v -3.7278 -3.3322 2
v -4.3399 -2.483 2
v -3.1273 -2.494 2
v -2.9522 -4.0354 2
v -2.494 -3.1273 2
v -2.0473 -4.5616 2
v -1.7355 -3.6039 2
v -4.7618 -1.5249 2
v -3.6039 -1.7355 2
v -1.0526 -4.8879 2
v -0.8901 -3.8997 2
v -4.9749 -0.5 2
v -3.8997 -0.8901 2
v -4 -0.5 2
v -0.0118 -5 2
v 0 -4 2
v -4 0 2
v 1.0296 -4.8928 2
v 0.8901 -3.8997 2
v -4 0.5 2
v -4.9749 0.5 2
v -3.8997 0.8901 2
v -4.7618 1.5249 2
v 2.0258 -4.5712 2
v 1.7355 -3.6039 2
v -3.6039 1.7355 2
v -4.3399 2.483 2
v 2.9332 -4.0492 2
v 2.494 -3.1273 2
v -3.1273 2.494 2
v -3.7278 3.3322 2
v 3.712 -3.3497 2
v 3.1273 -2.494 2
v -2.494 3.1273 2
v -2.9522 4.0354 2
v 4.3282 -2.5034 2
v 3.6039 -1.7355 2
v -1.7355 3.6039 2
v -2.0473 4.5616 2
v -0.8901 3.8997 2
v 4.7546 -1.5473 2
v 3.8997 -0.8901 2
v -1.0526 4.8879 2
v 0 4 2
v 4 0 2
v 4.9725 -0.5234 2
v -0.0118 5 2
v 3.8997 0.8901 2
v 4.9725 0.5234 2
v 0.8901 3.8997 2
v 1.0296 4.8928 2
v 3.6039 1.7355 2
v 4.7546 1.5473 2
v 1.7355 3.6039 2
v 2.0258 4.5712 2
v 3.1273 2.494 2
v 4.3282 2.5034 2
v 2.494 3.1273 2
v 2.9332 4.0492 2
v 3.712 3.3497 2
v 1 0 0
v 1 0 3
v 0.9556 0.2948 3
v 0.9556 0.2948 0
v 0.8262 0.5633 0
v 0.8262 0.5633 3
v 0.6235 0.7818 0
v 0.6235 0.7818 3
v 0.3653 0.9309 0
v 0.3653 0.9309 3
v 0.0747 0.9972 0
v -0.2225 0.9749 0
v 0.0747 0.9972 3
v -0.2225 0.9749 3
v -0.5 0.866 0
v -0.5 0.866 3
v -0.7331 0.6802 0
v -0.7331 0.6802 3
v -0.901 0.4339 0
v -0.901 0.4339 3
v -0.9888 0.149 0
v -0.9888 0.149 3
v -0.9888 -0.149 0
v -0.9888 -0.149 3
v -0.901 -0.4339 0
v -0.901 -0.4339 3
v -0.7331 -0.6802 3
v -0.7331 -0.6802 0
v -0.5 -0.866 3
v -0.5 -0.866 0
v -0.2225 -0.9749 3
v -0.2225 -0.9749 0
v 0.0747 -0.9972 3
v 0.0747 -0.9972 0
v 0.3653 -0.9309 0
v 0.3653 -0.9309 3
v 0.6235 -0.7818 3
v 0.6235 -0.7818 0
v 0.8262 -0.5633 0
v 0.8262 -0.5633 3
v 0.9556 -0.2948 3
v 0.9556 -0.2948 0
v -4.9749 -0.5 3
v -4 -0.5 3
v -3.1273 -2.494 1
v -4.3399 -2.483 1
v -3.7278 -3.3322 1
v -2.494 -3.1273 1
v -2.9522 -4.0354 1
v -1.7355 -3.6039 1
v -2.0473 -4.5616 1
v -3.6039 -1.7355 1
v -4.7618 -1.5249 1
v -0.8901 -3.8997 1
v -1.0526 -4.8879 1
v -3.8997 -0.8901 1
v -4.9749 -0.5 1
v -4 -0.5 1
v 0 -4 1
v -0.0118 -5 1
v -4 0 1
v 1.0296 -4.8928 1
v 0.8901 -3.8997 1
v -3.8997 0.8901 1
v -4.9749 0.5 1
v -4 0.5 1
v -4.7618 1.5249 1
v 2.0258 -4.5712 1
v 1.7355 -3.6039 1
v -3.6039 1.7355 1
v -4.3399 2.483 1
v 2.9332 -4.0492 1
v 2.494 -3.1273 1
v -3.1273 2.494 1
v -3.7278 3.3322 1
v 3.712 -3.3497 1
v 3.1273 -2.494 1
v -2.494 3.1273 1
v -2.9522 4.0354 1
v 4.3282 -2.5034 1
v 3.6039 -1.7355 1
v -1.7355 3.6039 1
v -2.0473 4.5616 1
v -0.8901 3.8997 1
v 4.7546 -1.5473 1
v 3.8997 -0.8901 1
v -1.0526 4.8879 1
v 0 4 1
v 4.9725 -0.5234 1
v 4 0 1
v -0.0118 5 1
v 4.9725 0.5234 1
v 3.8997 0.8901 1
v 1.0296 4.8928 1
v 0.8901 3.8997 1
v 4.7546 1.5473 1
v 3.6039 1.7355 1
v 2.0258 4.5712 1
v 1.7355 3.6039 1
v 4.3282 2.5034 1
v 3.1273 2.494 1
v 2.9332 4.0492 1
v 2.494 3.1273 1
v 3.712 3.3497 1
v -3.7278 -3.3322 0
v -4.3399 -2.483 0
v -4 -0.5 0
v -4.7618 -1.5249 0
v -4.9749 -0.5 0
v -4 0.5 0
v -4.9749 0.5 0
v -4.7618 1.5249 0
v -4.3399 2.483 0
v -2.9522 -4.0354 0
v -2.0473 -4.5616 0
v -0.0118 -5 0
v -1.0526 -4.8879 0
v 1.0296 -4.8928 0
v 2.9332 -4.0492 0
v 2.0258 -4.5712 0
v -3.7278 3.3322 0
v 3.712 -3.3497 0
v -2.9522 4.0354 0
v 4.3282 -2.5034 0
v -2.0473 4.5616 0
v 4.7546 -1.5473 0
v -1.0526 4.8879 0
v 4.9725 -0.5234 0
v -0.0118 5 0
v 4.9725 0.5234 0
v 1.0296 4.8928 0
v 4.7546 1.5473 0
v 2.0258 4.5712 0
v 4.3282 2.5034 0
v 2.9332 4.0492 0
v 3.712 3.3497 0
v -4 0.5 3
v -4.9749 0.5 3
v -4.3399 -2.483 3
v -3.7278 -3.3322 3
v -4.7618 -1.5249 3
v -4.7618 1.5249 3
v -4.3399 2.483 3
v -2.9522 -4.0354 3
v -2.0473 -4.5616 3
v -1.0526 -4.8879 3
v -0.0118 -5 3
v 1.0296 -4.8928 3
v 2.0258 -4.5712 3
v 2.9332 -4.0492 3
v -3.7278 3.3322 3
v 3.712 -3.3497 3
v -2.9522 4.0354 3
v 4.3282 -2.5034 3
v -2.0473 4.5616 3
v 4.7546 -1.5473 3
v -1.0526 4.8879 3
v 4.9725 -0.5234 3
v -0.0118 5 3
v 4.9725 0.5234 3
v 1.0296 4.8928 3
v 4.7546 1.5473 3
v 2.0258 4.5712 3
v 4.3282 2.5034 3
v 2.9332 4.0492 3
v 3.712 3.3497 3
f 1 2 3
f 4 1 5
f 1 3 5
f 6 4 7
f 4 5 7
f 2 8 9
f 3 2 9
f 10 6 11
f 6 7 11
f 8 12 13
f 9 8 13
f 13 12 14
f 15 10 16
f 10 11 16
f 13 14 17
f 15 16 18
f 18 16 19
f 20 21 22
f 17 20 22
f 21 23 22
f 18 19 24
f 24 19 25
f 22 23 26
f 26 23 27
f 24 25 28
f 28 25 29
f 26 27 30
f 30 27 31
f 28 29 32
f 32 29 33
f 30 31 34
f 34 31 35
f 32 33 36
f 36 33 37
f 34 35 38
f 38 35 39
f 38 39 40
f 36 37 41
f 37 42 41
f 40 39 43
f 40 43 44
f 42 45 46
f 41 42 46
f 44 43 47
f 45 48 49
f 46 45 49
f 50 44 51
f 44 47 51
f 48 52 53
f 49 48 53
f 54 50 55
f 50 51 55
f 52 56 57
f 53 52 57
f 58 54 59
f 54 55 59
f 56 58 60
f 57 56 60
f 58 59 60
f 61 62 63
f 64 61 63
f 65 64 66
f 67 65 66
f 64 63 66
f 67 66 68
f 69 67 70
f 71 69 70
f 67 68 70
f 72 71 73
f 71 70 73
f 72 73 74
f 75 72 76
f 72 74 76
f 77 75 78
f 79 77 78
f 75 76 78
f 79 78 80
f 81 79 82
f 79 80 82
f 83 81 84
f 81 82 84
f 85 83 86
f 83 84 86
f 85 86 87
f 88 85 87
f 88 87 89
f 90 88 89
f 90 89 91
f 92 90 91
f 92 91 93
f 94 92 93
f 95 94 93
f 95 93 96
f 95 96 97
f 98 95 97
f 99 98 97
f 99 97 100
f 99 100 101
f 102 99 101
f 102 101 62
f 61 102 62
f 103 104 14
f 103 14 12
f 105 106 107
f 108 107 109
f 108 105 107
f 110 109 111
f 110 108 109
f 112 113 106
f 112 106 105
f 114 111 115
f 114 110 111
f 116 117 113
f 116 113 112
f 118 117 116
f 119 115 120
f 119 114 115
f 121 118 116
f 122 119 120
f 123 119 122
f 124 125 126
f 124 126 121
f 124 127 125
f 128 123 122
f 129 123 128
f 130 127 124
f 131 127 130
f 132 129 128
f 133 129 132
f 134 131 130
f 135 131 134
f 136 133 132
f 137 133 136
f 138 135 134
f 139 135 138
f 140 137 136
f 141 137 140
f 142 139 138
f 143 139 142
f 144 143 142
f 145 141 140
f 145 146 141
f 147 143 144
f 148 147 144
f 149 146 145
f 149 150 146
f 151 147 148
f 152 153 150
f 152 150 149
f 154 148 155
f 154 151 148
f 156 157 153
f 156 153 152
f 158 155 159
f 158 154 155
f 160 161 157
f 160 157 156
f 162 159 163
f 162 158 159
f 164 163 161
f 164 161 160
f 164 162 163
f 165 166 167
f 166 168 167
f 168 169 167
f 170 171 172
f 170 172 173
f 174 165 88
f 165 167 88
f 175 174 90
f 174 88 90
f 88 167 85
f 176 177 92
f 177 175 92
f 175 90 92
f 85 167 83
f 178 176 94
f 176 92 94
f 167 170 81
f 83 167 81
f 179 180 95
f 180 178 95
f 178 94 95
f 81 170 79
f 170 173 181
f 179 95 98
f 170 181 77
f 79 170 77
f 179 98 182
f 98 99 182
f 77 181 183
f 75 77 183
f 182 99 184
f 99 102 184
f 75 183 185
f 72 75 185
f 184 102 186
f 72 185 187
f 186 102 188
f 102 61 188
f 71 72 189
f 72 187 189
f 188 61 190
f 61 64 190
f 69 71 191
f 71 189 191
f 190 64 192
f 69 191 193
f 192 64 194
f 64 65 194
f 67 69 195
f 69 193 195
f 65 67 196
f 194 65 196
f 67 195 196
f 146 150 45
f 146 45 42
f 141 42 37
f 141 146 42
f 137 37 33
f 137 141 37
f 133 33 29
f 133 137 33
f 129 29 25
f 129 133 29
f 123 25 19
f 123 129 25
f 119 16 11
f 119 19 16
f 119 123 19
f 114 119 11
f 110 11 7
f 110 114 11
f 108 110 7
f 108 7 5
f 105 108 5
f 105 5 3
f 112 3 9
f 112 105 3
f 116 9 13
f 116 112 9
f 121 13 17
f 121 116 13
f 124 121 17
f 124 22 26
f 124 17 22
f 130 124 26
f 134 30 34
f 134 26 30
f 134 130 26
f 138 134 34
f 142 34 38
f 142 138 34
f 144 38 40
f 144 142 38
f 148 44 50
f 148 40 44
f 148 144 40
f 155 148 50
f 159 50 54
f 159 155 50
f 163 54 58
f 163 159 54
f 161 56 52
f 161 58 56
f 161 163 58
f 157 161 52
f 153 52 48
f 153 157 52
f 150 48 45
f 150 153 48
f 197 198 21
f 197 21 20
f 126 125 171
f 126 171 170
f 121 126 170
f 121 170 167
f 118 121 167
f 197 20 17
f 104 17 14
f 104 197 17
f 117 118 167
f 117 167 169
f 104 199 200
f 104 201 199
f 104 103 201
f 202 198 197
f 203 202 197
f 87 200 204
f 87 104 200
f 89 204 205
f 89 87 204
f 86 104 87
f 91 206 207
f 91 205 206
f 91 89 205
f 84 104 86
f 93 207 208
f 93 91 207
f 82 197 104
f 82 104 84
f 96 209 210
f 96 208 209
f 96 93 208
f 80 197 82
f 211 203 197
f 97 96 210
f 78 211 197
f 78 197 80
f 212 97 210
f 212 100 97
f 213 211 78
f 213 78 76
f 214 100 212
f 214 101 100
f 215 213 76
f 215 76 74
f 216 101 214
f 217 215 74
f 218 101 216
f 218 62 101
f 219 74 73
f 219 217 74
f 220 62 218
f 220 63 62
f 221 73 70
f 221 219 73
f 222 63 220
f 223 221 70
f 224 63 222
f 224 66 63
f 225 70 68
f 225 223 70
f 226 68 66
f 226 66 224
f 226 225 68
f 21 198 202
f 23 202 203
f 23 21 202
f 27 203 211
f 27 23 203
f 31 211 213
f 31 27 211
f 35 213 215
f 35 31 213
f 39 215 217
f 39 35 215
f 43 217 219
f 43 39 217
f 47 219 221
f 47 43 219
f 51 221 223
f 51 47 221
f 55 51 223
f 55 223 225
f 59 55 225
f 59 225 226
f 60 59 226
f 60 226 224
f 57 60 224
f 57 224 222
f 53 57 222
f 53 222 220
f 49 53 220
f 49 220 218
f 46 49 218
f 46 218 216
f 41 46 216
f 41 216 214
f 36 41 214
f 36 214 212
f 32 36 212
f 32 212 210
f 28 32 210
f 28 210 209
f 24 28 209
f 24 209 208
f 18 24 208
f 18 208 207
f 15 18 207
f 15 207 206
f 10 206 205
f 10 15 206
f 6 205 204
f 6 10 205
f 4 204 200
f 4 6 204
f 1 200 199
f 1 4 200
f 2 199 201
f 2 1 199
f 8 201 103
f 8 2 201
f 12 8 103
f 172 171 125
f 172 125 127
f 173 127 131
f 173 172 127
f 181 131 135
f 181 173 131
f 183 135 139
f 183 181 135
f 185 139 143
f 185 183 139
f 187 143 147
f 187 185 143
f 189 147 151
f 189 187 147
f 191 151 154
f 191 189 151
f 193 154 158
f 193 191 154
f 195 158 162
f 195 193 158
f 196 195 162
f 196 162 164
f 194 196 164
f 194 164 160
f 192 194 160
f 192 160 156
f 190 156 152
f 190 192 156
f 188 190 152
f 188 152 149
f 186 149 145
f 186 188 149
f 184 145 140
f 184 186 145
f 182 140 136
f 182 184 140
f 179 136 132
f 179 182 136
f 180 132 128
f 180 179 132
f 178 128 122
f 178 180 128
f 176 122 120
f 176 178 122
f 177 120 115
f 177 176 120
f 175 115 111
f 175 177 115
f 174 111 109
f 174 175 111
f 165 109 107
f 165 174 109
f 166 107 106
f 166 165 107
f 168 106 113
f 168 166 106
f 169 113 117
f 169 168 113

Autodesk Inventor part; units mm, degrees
ref_plane "YZ Plane" through (0, 0, 0) normal (1, 0, 0) x (0, 1, 0)
ref_plane "XZ Plane" through (0, 0, 0) normal (0, 1, 0) x (-1, 0, 0)
ref_plane "XY Plane" through (0, 0, 0) normal (0, 0, 1) x (1, 0, 0)
sketch "Esboço1" plane through (0, 0, 0) normal (0, 0, 1) x (1, 0, 0)
  circle A0 centre (0, 0) radius 5
  dimension "d0" = 10
extrude "Extrusão1" add sketch "Esboço1" along normal blind 1
sketch "Esboço2" plane through (0, 0, 1) normal (0, 0, 1) x (1, 0, 0)
  circle A0 centre (0, 0) radius 4
  dimension "d3" = 8
extrude "Extrusão2" add sketch "Esboço2" along normal blind 1
sketch "Esboço3" plane through (0, 0, 2) normal (0, 0, 1) x (1, 0, 0)
  circle A0 centre (0, 0) radius 5
  dimension "d6" = 10
extrude "Extrusão3" add sketch "Esboço3" along normal blind 1
sketch "Esboço4" plane through (0, 0, 3) normal (0, 0, 1) x (1, 0, 0)
  circle A0 centre (0, 0) radius 4 projected
  circle A1 centre (0, 0) radius 1
  dimension "d9" = 2
extrude "Extrusão4" cut sketch "Esboço4" against normal blind 4 contours A1
thread "Rosca1" size "M2x0.4" class "6H" standard "ANSI Metric M Profile" full length
sketch "Esboço5" plane through (0, 0, 3) normal (0, 0, 1) x (1, 0, 0)
  circle A0 centre (0, 0) radius 5 projected
  line L0 (-4, 0) -> (-4, -0.5)
  circle A1 centre (0, 0) radius 4 projected
  line L1 (-4, 0) -> (-3.5, 0) construction
  line L2 (-4, -0.5) -> (-5, -0.5)
  line L3 (-5, -0.5) -> (-5, 0.5)
  line L4 (-5, -0.5) -> (-4, -0.5) construction
  line L5 (-5, 0.5) -> (-4, 0.5)
  line L6 (-4, 0.5) -> (-4, 0)
  line L7 (-4, -0.5) -> (-5, -0.5)
  dimension "d15" = 0.5
  dimension "d16" = 90
  dimension "d17" = 1
  dimension "d18" = 90
extrude "Extrusão5" cut sketch "Esboço5" against normal blind 10 contours L5 L6 L0 L2 A0 | A0 L3 L5 | L2 L3 A0 picked at (-4.3296, -0.2779)
properties part number "Polia"
